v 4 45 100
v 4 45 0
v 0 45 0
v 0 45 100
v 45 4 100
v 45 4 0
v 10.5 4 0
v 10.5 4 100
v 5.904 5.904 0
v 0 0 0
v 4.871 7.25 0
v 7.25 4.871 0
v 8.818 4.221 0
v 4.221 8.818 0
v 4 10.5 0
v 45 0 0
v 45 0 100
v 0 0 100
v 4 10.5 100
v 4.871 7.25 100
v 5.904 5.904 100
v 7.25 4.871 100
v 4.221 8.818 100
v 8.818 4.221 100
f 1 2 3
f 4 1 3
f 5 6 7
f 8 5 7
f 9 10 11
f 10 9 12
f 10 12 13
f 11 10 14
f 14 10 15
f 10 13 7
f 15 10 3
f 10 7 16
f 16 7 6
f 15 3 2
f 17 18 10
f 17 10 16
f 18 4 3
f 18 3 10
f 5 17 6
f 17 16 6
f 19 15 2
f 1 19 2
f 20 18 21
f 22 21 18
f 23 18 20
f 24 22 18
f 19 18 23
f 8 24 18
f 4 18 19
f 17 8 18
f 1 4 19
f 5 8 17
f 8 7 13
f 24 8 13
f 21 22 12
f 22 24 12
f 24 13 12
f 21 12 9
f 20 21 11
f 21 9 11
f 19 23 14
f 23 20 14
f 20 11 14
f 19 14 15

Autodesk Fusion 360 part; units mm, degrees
sketch "スケッチ1" plane through (0, 0, 0) normal (0, 0, 1) x (1, 0, 0)
  line L0 (0, 45) -> (0, 0)
  line L1 (4, 10.5) -> (4, 45)
  line L2 (45, 4) -> (10.5, 4)
  line L3 (0, 0) -> (45, 0)
  arc A0 (4, 10.5) -> (10.5, 4) centre (10.5, 10.5) ccw
  line L4 (45, 0) -> (45, 4)
  line L5 (4, 45) -> (0, 45)
extrude "押し出し1" add sketch "スケッチ1" along normal blind 100
